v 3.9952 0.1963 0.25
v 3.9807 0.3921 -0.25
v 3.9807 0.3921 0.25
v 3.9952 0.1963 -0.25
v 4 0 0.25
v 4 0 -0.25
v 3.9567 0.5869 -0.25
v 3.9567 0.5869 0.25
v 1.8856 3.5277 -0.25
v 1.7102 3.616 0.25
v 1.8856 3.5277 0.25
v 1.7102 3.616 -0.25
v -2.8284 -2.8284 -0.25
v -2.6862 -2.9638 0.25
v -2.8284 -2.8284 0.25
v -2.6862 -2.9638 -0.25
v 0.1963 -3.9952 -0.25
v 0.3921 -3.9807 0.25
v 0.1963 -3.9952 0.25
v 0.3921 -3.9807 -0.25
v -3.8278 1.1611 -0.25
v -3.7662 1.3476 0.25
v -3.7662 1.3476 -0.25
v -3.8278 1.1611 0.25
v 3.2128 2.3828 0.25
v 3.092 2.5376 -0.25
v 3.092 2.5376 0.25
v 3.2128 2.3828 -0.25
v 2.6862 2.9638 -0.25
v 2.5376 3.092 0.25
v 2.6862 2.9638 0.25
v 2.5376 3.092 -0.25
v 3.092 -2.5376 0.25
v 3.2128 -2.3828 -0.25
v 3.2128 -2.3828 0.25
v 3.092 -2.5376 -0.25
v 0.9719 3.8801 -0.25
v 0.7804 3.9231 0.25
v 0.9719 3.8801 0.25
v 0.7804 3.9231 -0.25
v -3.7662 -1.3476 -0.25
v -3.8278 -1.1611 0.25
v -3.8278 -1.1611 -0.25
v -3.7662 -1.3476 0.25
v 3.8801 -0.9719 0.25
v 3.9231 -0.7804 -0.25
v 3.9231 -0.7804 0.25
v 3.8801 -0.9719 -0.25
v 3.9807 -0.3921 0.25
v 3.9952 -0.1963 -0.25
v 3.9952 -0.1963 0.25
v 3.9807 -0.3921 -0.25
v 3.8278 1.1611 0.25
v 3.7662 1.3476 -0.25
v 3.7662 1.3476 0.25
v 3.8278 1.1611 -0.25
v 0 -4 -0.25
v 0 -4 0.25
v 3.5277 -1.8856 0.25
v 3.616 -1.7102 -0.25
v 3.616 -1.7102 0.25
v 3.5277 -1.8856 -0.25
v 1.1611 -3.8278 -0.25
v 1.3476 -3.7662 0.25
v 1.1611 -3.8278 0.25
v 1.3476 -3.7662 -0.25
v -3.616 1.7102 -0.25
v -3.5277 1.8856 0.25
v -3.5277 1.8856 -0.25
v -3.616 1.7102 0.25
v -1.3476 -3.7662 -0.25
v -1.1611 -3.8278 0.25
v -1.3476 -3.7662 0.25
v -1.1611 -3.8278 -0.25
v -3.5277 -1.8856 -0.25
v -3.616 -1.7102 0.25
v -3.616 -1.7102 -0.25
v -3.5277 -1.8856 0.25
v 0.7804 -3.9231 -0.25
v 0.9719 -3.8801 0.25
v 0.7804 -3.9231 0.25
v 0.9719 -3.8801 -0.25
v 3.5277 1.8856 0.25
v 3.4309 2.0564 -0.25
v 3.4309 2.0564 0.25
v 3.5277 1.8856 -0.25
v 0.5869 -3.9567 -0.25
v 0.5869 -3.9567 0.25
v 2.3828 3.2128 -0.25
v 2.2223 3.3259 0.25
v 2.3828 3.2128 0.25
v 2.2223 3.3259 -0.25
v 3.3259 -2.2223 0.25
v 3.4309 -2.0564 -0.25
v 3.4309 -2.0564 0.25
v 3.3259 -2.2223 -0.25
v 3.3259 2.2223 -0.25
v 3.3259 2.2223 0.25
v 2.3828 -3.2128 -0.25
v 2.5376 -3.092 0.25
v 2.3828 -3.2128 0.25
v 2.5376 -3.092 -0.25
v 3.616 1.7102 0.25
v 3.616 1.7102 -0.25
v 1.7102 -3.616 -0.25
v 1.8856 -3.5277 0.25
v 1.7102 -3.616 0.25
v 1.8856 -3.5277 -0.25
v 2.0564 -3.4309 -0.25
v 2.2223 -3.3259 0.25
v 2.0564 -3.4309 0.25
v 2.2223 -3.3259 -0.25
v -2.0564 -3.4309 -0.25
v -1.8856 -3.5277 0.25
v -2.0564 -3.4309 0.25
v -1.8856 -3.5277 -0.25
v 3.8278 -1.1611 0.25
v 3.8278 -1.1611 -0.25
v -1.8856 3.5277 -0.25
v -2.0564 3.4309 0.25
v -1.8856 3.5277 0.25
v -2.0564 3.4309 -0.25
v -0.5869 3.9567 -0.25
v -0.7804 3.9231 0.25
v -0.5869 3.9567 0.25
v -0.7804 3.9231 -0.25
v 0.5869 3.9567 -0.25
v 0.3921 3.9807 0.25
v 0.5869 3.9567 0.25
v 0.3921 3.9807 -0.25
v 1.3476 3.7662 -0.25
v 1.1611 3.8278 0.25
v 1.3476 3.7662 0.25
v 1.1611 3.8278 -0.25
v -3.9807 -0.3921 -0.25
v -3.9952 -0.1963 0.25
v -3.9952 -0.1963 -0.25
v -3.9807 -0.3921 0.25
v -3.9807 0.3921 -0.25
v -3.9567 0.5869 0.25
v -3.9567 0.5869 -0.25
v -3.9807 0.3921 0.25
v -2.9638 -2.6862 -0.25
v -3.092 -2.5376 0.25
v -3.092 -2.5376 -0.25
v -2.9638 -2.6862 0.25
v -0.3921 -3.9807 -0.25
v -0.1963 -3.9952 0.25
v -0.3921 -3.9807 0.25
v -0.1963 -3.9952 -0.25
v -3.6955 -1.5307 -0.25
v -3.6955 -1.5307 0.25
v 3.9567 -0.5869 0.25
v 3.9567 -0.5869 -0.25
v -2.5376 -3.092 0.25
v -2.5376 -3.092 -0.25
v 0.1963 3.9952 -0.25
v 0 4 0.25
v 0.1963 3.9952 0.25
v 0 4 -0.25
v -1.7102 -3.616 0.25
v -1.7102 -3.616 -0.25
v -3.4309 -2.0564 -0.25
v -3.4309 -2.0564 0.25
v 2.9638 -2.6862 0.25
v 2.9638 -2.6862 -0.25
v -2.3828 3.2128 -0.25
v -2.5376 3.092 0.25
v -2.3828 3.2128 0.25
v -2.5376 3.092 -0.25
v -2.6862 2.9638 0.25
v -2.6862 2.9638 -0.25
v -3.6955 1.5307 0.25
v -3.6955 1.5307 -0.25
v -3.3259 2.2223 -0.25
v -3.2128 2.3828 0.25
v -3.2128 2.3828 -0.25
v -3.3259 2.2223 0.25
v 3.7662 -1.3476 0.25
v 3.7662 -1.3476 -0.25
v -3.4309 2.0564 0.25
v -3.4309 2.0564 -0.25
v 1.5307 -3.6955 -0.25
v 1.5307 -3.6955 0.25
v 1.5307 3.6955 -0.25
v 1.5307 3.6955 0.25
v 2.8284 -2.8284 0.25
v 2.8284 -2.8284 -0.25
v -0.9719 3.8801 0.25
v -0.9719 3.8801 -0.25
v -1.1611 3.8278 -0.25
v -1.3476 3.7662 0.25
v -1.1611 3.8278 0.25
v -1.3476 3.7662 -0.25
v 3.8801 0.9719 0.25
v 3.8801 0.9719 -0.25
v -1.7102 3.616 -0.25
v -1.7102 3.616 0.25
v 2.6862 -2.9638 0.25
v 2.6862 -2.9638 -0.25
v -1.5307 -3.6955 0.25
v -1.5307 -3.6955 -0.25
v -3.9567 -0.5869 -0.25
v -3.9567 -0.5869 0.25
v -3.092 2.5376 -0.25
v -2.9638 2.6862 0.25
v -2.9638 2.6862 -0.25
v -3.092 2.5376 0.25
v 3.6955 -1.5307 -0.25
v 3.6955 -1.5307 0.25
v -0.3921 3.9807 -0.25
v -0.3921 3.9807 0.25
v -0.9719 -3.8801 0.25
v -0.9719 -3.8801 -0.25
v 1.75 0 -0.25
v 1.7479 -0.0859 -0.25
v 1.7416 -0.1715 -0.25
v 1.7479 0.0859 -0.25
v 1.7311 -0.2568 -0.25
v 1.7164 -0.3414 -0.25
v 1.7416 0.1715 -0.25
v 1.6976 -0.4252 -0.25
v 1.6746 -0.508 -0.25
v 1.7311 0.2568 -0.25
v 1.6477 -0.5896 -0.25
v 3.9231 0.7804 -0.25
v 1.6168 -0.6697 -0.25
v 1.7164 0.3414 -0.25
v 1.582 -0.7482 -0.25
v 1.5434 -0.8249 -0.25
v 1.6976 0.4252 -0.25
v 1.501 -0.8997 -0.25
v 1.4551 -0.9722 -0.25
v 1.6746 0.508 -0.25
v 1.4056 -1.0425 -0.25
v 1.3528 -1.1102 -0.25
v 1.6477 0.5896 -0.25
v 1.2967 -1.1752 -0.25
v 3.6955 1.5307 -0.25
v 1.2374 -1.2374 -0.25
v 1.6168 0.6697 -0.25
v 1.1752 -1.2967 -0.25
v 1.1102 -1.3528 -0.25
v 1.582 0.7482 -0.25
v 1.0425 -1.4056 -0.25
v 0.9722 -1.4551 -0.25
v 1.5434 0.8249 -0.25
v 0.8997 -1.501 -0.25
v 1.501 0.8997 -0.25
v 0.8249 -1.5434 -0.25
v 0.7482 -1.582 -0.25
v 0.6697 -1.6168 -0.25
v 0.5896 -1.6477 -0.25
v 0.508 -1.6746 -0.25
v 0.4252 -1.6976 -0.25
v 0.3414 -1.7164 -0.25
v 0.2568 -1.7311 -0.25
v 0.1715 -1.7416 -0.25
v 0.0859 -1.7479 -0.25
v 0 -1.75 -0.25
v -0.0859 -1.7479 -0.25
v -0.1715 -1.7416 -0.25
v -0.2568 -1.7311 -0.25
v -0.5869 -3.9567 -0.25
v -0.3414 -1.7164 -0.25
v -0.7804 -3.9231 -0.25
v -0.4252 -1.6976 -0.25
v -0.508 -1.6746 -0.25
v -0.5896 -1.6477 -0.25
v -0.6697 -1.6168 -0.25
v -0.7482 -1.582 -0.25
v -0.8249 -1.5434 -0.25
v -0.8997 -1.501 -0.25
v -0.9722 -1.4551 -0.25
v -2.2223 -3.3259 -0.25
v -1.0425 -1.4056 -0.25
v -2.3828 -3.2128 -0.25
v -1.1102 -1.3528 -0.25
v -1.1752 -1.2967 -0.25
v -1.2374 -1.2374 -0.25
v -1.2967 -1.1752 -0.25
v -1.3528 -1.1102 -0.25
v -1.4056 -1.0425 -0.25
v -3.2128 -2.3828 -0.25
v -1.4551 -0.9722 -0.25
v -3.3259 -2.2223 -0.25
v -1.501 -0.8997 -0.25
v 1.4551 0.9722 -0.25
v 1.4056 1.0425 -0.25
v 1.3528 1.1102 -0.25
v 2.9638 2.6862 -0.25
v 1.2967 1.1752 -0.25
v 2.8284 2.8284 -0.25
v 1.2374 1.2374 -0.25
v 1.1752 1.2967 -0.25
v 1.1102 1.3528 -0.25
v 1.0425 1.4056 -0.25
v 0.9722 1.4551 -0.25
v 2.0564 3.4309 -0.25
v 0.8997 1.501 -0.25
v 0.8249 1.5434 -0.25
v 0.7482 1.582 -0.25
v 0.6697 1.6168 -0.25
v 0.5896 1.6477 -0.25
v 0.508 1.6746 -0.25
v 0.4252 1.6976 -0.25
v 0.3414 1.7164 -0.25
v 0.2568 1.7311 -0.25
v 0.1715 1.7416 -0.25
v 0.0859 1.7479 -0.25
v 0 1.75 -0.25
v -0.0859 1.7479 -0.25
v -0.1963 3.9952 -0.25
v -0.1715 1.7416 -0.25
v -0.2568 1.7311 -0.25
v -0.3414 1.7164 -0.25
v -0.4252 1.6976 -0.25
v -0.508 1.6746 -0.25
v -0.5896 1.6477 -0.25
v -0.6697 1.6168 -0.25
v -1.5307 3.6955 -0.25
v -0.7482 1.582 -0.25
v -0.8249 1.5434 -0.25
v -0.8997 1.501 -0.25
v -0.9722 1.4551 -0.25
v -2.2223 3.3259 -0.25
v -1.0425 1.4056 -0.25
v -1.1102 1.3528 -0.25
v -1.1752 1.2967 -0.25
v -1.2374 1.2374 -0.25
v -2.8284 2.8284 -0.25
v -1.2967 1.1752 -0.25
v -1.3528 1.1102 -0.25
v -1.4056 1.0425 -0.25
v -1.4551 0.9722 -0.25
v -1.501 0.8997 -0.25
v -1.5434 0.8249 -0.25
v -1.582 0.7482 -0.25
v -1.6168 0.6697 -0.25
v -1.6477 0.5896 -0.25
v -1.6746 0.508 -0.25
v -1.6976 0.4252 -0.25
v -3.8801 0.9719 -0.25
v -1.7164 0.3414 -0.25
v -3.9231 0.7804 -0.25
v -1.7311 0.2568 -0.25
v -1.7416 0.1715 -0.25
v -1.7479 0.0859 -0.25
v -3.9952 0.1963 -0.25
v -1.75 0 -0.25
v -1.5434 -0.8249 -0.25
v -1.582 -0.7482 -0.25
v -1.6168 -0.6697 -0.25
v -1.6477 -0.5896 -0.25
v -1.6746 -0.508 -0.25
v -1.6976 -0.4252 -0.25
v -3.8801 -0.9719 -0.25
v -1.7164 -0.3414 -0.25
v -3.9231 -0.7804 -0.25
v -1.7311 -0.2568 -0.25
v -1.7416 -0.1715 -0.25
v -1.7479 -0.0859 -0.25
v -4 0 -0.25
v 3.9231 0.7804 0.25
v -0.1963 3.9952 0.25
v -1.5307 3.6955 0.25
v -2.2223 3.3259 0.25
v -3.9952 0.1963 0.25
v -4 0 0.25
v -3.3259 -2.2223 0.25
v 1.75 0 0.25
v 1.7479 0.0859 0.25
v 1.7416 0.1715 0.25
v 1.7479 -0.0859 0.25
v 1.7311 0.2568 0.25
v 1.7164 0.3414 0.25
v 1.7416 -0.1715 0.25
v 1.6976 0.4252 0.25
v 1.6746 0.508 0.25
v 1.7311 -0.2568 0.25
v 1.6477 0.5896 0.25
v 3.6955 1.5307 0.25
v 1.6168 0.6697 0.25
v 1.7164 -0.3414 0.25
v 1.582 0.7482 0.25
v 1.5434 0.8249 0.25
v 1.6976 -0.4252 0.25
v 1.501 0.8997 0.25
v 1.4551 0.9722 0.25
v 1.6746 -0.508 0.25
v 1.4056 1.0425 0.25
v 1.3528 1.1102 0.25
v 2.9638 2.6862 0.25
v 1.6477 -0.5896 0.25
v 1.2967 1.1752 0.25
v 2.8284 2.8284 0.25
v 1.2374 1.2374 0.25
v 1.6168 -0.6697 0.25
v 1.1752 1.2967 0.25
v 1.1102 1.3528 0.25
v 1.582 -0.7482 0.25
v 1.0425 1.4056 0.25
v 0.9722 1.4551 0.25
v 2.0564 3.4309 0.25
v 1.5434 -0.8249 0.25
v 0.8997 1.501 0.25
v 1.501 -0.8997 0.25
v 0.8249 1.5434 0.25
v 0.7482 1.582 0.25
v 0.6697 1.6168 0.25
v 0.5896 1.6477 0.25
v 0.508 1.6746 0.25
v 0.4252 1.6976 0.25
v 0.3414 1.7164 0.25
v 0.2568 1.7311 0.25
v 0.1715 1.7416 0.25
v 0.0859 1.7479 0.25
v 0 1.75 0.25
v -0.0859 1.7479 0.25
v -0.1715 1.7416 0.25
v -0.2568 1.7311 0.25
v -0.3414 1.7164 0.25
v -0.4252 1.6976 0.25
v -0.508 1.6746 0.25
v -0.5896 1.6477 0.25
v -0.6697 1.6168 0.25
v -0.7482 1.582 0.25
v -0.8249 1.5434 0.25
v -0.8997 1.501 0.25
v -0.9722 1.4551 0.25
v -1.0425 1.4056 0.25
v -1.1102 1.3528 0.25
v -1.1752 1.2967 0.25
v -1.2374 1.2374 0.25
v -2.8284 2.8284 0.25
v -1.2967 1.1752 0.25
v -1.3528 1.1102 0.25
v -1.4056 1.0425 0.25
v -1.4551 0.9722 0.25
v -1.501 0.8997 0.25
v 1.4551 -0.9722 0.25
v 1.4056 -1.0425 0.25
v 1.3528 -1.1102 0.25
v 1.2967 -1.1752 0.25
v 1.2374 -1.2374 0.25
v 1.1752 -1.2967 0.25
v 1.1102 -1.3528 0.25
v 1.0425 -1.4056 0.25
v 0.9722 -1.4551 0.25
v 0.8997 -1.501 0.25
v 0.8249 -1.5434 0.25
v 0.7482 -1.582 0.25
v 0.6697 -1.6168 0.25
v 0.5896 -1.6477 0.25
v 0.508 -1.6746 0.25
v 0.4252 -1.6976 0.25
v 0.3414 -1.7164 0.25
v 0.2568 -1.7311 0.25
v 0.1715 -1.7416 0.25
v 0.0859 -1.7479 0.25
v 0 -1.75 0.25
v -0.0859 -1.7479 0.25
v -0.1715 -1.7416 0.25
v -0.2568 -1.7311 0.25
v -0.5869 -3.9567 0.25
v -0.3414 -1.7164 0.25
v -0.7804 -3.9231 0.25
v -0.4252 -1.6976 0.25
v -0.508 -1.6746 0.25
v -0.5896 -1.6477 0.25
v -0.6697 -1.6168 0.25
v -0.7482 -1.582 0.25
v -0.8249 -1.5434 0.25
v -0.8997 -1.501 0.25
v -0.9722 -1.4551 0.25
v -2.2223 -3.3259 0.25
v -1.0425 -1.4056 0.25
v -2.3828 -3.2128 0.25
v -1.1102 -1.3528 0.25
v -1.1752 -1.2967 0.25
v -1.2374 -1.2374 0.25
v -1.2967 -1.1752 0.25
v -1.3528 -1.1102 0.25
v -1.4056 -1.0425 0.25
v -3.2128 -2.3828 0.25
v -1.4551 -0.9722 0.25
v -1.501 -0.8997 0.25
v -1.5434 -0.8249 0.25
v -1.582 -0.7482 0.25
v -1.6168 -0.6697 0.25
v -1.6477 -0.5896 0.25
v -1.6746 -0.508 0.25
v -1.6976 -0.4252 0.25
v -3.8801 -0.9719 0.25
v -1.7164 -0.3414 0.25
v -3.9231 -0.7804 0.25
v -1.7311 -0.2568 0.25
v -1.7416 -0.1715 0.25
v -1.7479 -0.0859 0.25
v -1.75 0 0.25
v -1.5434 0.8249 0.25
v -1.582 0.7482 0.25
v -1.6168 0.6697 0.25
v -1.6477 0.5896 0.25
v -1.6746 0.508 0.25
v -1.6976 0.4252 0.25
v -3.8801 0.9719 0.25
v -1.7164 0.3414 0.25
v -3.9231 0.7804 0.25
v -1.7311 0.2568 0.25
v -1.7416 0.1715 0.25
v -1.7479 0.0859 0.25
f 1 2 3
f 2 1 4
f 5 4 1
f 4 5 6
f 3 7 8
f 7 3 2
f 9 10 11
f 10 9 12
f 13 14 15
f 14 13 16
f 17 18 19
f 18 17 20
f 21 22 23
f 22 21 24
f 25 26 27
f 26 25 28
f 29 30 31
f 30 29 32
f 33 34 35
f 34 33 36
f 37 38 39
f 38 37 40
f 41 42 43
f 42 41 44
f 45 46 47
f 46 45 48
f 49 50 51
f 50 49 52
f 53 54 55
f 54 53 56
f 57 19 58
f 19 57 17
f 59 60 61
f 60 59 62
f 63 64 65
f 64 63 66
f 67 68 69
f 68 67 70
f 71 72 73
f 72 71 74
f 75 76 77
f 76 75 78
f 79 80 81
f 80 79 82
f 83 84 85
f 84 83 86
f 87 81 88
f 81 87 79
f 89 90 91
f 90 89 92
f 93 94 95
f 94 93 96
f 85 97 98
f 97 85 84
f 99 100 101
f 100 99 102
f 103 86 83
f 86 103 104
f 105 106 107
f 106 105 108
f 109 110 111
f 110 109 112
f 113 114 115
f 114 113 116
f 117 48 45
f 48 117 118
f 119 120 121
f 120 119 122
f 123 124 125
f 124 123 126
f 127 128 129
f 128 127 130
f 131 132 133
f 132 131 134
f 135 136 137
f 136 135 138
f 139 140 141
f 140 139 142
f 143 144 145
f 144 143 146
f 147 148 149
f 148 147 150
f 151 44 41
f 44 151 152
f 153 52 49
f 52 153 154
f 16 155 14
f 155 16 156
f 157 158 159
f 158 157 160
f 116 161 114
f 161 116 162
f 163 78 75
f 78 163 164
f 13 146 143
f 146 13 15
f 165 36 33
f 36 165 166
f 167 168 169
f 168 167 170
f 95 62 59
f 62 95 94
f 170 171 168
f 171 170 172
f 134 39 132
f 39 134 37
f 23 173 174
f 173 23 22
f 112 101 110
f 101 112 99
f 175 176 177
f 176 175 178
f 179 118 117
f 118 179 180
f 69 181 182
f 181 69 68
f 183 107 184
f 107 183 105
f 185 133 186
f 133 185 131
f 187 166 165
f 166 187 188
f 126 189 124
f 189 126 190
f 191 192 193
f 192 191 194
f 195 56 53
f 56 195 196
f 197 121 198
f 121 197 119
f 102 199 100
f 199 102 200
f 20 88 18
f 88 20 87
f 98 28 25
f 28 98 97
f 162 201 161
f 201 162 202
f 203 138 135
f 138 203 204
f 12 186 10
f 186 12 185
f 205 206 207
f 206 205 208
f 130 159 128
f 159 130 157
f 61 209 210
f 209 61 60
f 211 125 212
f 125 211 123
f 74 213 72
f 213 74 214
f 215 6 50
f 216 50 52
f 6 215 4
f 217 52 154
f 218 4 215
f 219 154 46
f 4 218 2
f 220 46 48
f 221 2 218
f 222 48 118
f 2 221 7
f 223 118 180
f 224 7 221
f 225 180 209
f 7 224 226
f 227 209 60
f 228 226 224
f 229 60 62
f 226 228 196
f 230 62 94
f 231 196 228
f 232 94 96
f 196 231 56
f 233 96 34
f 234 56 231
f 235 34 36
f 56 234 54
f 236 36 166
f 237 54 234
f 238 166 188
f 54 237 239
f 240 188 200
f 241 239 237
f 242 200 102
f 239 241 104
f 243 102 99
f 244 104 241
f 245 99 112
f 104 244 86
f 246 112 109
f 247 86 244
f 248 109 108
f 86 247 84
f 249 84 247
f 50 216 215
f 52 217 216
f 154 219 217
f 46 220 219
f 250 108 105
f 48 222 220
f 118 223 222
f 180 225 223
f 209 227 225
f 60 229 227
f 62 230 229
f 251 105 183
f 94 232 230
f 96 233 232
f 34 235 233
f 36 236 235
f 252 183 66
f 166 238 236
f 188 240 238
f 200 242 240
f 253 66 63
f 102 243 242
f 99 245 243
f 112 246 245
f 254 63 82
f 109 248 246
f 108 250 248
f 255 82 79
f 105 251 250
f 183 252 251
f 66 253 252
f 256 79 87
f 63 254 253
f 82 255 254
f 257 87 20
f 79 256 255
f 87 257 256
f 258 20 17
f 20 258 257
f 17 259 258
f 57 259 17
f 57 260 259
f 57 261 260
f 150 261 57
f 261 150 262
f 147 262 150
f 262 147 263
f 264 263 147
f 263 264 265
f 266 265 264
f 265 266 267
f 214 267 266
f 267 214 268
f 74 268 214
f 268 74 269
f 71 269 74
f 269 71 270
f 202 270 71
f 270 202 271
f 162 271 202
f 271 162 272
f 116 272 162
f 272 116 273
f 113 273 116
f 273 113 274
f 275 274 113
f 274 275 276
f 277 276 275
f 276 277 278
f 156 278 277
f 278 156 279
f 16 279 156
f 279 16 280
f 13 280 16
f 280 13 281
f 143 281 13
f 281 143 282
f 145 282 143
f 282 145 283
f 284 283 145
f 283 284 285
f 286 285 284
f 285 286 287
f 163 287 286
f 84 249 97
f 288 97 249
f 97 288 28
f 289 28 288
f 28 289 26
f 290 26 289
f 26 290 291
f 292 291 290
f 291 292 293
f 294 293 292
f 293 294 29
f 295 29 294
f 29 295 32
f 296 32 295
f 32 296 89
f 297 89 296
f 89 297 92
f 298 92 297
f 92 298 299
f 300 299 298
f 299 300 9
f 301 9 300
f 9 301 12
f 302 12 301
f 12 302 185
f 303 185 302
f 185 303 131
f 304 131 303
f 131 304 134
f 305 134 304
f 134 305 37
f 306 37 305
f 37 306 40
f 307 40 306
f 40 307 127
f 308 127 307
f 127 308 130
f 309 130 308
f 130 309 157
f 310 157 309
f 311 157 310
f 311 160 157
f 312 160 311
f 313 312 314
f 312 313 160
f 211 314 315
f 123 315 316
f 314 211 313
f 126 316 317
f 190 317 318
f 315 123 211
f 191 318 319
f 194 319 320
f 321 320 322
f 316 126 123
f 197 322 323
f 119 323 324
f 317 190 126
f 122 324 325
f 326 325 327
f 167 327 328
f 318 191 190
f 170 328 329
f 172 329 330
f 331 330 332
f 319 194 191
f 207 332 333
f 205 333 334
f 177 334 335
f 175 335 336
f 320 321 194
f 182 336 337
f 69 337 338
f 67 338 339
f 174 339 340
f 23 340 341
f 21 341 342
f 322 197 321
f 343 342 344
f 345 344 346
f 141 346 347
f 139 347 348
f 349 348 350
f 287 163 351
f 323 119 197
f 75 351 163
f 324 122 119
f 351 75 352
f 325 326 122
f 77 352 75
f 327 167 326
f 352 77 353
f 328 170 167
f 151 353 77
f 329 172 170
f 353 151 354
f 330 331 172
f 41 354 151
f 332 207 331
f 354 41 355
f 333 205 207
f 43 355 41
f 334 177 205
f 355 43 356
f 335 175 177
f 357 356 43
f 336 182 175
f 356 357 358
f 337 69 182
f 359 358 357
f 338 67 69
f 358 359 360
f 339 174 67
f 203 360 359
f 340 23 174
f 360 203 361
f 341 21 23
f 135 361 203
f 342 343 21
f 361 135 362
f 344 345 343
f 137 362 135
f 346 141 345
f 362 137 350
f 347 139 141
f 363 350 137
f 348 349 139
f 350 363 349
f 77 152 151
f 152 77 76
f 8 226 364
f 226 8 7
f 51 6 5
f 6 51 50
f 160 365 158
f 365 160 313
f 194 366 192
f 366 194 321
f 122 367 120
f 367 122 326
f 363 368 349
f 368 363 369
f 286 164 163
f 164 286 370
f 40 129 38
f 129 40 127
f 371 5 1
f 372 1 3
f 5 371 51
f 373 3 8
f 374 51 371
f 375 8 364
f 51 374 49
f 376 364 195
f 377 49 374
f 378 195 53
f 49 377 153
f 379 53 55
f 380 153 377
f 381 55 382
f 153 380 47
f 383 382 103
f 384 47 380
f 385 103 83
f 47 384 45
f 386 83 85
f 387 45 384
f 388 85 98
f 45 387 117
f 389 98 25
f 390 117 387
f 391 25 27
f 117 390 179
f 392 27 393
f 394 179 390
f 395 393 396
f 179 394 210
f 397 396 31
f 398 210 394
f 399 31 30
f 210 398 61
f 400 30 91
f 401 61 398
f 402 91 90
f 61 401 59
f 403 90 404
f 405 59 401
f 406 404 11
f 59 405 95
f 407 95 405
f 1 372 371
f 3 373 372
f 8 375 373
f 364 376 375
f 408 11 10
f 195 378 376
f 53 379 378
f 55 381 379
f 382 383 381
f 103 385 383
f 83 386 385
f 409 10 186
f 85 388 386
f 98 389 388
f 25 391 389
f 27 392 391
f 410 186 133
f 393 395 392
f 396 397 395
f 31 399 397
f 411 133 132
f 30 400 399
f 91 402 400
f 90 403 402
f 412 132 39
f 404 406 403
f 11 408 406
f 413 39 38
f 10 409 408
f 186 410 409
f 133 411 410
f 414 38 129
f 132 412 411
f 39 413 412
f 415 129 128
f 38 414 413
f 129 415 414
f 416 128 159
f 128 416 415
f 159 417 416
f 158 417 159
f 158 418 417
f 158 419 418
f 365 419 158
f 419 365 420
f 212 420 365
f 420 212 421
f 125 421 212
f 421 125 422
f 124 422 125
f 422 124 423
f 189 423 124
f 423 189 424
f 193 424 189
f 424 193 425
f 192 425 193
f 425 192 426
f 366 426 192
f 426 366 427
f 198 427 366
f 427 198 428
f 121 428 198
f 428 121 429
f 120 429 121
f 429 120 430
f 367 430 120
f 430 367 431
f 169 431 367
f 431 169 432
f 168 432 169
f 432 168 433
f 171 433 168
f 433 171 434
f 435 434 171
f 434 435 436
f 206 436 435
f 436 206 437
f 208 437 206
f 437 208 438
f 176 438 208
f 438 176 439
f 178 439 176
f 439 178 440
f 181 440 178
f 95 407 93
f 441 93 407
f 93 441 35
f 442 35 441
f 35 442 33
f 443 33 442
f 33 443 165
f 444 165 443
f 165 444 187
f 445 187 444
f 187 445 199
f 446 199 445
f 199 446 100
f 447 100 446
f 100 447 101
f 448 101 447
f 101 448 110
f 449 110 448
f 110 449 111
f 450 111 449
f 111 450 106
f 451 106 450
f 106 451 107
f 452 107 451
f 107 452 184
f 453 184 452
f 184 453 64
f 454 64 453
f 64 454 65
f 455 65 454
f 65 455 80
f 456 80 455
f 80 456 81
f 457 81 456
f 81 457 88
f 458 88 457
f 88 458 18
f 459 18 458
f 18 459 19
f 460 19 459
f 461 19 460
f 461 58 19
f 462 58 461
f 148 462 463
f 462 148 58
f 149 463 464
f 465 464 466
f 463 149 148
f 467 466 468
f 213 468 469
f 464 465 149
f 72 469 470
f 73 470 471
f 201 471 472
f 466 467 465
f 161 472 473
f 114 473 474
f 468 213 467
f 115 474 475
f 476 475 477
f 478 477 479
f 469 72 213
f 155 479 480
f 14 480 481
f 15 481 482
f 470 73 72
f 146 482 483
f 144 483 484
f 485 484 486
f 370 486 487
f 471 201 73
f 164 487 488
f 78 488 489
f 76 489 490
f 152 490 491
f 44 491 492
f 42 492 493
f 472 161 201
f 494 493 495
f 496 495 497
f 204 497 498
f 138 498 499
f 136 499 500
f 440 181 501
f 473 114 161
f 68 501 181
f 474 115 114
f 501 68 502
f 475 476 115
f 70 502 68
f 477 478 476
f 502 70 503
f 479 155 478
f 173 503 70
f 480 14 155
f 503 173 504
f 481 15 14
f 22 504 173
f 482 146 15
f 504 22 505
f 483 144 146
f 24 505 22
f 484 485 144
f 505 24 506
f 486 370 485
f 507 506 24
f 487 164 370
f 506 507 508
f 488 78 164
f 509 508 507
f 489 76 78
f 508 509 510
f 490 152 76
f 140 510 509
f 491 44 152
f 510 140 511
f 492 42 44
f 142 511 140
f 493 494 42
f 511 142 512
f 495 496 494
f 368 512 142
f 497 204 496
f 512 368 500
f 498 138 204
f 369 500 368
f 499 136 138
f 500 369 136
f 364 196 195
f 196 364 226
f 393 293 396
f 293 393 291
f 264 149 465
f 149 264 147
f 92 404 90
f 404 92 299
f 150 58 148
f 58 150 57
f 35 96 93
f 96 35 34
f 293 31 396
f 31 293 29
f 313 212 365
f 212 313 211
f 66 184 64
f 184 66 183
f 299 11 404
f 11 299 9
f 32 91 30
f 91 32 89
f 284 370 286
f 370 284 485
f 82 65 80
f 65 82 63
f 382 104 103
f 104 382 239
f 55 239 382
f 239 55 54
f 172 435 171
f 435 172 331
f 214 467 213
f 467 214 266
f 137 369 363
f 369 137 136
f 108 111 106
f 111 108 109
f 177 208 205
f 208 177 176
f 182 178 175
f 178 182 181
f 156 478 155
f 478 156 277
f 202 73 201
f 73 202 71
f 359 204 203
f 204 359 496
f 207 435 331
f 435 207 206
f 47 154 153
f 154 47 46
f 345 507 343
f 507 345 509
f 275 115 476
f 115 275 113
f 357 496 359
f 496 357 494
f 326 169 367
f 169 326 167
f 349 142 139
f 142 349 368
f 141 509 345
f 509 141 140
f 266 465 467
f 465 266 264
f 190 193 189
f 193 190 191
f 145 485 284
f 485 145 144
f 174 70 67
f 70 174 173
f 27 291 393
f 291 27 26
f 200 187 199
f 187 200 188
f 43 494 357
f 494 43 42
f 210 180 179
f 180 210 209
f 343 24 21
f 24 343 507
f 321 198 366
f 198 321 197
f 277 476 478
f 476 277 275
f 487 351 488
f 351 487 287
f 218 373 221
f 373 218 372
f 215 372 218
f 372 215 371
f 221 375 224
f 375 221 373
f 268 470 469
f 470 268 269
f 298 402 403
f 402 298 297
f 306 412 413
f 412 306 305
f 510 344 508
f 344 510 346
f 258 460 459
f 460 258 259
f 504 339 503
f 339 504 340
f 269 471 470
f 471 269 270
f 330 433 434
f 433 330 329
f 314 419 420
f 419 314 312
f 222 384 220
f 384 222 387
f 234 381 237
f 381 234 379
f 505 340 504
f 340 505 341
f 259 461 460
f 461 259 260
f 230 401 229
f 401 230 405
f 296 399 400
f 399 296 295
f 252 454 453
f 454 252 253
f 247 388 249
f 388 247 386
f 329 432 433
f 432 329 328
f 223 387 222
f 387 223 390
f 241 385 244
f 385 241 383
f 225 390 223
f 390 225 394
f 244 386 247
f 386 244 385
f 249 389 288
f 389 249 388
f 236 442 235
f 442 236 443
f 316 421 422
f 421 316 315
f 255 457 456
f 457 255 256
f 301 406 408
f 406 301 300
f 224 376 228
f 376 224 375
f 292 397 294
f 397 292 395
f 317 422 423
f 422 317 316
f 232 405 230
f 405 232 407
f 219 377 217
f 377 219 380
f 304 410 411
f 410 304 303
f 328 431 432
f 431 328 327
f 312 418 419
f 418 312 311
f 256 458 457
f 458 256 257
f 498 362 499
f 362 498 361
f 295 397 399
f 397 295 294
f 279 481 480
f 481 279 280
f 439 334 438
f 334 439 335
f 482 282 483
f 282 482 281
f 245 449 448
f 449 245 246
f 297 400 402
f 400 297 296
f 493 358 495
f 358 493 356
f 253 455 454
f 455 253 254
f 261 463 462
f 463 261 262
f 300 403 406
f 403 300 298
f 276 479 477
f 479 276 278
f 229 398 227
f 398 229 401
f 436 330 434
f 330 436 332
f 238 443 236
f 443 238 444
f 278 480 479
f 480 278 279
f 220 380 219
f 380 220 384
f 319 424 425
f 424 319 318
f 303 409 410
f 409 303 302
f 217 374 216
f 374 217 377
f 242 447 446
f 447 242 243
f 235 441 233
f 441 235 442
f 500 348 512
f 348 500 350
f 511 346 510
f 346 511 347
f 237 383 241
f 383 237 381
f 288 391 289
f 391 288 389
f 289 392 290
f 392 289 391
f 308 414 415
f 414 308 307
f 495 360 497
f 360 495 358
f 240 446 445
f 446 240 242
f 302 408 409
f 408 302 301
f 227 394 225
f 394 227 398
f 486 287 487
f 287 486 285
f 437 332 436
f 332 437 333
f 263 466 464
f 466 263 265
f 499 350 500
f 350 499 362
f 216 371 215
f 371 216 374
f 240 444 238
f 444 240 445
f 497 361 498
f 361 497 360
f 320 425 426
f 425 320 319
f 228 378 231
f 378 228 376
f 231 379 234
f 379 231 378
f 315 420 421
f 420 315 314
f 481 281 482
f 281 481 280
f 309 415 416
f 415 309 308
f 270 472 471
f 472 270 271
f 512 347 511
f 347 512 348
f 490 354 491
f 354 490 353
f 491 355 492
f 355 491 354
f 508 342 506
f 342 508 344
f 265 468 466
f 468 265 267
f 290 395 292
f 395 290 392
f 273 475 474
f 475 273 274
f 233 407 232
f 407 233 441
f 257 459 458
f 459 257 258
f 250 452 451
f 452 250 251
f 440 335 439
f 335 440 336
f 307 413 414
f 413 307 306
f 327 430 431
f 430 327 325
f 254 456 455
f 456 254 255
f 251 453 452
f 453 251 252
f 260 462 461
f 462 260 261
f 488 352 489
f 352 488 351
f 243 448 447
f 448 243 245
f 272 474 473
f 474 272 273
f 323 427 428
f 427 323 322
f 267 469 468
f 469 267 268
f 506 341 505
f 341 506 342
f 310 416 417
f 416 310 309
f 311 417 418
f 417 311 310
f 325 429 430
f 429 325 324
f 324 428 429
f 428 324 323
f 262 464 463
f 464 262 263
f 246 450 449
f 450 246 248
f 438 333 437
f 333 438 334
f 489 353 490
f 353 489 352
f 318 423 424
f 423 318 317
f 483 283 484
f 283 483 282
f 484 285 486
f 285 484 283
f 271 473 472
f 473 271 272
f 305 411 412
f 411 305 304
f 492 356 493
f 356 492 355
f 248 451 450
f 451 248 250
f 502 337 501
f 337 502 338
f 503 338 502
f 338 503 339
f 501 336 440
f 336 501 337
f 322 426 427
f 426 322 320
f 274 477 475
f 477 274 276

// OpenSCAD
// Flat washer: 3.5mm ID, 8.0mm OD, 0.5mm thickness

id = 3.5;
od = 8.0;
thickness = 0.5;

$fn = 128;

eps = 0.02; // small overlap to ensure clean boolean

difference() {
    cylinder(h = thickness, r = od/2, center = true);
    cylinder(h = thickness + 2*eps, r = id/2, center = true);
}
